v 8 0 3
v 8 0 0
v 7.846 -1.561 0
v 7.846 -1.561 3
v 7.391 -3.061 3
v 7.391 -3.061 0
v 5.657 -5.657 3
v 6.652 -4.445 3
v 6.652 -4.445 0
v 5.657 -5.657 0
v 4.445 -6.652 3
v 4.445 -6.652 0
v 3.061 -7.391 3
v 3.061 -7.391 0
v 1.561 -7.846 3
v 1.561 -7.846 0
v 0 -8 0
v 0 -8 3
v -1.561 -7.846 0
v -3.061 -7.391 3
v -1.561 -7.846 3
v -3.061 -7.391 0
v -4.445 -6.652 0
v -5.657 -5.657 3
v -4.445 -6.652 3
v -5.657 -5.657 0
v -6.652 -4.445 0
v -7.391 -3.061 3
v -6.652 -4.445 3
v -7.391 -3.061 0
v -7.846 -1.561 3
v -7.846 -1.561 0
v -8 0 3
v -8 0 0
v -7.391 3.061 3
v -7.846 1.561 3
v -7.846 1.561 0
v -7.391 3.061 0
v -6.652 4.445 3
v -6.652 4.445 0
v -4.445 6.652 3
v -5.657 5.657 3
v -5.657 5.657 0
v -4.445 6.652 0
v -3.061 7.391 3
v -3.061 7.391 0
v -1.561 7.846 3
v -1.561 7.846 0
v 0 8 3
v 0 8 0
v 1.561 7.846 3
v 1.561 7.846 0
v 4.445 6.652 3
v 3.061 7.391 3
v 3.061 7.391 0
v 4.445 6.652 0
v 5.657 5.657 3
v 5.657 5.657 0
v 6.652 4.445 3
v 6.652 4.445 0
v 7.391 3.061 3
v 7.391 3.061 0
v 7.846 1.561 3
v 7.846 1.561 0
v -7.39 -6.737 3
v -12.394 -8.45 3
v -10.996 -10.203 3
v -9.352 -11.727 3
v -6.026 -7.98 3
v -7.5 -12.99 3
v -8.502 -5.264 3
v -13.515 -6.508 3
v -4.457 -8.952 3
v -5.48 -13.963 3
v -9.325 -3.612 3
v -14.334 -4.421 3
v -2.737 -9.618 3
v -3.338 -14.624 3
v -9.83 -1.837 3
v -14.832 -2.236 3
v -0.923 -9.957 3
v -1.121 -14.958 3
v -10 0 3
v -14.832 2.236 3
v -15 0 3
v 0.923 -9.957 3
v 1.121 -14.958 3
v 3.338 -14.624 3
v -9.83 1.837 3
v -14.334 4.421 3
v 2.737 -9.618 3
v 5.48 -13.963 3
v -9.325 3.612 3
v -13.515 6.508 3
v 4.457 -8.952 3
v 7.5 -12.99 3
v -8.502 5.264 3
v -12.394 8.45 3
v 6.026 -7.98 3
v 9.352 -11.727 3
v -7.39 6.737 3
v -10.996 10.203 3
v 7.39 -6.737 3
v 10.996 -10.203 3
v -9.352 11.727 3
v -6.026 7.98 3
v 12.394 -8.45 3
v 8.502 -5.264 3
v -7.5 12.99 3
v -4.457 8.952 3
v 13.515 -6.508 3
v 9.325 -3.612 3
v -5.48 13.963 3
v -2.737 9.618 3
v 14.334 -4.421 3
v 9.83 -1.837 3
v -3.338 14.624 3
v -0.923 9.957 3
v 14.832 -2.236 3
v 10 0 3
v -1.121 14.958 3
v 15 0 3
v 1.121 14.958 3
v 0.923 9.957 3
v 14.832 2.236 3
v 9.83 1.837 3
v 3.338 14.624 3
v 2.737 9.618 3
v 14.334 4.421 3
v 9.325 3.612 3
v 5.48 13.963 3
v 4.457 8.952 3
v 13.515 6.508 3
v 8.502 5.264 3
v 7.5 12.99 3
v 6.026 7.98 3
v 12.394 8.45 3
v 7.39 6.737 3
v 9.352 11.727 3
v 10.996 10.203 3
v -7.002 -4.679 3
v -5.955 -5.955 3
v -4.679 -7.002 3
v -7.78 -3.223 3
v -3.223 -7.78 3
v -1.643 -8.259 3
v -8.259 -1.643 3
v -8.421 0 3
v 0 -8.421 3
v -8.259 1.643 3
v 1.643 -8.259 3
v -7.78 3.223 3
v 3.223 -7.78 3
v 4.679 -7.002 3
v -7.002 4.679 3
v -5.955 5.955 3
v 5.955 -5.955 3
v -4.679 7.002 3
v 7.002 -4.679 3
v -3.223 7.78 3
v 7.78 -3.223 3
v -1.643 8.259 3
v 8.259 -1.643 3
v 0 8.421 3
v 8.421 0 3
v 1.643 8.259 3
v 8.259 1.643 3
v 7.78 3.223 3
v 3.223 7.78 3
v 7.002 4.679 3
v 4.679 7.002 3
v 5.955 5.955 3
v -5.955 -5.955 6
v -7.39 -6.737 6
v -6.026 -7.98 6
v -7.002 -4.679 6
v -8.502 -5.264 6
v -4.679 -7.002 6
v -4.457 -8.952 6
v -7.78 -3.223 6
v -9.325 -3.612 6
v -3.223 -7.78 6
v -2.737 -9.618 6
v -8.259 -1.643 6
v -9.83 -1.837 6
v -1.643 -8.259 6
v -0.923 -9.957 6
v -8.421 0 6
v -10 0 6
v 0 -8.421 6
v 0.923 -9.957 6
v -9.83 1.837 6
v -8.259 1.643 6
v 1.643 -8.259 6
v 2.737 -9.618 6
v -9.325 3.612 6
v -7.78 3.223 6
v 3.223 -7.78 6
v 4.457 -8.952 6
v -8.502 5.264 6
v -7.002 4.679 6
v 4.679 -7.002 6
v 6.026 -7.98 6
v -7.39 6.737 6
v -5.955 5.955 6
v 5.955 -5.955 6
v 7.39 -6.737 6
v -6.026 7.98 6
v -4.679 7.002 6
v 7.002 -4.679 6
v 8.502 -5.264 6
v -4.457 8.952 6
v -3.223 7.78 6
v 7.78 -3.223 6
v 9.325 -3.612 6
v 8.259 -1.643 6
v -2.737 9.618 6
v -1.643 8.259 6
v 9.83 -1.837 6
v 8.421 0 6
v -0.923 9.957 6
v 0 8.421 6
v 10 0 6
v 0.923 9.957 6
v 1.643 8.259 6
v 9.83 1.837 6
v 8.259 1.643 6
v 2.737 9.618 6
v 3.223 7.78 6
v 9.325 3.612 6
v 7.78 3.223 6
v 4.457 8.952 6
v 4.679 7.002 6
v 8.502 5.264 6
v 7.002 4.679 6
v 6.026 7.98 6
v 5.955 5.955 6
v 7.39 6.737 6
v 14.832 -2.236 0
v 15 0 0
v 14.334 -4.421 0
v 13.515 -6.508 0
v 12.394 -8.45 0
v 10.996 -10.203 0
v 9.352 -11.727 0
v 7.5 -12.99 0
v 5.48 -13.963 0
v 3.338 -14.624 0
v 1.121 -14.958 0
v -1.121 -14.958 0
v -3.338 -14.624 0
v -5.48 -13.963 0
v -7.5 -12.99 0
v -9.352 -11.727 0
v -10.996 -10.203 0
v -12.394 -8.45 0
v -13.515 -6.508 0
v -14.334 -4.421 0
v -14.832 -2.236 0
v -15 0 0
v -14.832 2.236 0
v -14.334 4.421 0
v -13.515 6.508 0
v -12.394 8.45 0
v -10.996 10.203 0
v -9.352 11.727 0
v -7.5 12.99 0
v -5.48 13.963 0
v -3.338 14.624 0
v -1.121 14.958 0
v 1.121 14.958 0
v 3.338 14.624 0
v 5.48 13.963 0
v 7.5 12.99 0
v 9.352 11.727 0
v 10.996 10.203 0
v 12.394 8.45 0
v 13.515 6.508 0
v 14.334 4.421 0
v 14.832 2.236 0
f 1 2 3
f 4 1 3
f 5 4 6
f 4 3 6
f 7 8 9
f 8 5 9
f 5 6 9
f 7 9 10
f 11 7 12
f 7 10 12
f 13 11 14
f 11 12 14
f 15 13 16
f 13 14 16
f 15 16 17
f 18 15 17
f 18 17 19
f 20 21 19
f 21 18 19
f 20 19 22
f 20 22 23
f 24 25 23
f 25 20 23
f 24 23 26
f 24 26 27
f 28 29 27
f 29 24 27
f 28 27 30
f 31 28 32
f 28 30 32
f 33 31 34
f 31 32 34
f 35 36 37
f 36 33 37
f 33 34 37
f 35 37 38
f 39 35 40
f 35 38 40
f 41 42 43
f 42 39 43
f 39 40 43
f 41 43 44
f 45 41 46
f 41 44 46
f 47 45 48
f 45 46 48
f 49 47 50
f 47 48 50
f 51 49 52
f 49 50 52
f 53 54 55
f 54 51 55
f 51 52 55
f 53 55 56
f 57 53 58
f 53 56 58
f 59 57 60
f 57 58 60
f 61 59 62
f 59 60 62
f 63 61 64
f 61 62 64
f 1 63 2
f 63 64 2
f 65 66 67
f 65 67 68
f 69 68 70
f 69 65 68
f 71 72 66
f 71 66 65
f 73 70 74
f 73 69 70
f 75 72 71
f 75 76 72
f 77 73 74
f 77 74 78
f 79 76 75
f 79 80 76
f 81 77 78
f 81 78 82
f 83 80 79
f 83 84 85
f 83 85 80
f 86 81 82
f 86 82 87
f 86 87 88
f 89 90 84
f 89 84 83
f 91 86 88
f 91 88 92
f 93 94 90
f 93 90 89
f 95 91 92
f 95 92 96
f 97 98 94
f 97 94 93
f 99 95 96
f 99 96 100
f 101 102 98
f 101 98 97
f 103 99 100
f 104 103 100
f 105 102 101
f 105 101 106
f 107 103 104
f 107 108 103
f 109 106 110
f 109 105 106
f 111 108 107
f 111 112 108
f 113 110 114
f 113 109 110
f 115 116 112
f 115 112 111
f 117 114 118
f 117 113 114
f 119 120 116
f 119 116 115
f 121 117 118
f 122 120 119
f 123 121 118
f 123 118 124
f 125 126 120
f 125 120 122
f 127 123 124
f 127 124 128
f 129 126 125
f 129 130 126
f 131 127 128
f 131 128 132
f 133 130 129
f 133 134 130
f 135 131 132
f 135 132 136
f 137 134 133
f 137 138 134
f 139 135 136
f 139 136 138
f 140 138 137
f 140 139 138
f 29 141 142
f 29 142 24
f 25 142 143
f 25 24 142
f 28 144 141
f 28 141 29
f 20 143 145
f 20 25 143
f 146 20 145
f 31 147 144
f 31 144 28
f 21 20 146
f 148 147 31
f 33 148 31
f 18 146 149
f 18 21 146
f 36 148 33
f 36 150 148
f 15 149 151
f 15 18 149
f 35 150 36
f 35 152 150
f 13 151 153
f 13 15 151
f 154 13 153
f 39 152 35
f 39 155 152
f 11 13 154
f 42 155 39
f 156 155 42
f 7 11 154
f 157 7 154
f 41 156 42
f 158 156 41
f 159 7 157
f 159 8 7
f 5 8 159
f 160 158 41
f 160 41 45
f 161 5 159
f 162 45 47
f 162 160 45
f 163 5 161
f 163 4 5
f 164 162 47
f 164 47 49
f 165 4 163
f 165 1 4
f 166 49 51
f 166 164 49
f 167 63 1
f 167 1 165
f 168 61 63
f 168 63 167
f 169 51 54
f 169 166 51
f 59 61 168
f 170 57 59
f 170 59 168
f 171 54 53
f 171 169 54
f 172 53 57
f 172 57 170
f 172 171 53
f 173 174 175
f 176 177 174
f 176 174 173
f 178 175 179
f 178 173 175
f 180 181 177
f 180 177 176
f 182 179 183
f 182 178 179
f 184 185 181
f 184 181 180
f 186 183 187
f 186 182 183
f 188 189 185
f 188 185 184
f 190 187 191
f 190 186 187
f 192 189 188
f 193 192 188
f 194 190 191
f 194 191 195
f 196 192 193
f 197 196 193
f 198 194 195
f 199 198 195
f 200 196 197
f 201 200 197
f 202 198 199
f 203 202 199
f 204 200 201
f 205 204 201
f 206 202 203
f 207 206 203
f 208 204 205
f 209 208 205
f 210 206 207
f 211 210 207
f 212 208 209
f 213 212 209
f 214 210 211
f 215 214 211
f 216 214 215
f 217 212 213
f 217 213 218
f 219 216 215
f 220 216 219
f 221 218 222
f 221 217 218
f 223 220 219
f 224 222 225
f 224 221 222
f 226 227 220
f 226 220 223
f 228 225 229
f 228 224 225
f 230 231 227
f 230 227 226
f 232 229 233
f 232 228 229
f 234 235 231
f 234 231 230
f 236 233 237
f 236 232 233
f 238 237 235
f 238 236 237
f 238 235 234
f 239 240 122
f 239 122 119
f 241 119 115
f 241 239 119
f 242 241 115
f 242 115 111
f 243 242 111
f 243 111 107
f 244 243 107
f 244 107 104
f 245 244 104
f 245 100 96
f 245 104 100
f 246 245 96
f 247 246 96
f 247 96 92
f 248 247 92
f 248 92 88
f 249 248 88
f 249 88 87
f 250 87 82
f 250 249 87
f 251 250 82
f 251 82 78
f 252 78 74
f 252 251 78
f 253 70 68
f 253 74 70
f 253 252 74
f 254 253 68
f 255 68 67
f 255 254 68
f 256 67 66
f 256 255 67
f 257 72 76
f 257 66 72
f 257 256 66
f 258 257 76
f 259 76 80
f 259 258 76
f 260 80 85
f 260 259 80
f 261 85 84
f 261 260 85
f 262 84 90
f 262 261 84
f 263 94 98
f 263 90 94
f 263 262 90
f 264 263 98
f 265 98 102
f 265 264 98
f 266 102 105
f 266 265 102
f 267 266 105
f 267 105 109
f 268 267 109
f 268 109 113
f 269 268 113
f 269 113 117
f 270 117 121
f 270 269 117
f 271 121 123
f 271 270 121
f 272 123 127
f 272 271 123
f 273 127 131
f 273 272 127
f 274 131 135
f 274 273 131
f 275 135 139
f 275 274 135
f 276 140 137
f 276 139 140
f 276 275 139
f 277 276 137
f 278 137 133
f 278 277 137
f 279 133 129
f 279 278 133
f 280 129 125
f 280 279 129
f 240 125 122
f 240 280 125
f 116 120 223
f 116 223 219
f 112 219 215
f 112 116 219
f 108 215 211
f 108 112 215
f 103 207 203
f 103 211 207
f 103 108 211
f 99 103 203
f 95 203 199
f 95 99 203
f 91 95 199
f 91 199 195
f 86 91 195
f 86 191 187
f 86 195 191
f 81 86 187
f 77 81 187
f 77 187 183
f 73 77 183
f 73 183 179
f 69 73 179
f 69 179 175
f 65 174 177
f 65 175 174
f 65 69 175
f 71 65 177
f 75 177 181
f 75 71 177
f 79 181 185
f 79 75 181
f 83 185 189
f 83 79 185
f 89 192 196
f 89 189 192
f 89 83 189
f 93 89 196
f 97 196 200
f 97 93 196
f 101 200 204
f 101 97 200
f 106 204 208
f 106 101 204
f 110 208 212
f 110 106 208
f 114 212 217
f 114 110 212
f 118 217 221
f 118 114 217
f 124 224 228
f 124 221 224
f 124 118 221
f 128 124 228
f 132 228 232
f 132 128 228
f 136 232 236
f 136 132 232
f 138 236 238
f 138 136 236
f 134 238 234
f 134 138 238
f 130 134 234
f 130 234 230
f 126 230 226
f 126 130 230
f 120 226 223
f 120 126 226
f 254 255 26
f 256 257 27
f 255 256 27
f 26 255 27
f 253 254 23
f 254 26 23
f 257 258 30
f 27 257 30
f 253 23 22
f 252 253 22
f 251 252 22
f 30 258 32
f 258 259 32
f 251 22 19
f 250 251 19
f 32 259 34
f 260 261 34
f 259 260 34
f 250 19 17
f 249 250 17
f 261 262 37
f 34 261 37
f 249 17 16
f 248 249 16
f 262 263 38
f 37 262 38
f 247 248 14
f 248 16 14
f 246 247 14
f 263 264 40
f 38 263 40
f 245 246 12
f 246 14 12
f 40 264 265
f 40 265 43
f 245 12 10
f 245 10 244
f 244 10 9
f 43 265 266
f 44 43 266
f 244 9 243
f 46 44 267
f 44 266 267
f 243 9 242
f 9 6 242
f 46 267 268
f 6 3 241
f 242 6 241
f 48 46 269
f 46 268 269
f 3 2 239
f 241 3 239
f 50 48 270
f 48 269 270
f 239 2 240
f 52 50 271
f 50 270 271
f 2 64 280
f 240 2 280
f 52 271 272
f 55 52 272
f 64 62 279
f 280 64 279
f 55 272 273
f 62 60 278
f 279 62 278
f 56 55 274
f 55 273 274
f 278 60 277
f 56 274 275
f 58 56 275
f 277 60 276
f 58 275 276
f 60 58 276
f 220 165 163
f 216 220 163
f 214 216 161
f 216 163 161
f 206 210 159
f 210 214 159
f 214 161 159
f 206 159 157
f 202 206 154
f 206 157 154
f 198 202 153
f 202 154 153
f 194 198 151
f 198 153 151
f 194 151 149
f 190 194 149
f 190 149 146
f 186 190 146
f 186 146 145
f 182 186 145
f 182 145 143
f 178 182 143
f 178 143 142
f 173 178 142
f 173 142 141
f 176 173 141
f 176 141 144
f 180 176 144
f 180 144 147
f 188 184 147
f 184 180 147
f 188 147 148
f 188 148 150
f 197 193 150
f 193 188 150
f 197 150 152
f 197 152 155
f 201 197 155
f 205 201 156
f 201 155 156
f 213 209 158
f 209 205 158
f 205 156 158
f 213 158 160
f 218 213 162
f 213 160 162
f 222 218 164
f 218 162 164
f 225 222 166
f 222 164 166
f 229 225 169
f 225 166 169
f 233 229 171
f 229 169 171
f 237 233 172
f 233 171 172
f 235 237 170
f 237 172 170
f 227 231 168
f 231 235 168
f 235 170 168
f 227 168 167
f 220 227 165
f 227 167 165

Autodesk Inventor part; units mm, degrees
ref_plane "YZ Plane" through (0, 0, 0) normal (1, 0, 0) x (0, 1, 0)
ref_plane "XZ Plane" through (0, 0, 0) normal (0, 1, 0) x (-1, 0, 0)
ref_plane "XY Plane" through (0, 0, 0) normal (0, 0, 1) x (1, 0, 0)
sketch "Sketch1" plane through (0, 0, 0) normal (0, 0, 1) x (1, 0, 0)
  circle A0 centre (0, 0) radius 8
  circle A1 centre (0, 0) radius 15
  dimension "d0" = 16
  dimension "d1" = 30
extrude "Extrusion1" add sketch "Sketch1" along normal blind 3
sketch "Sketch2" plane through (0, 0, 3) normal (0, 0, 1) x (1, 0, 0)
  circle A0 centre (0, 0) radius 8.4211
  circle A1 centre (0, 0) radius 10
  dimension "d4" = 20
extrude "Extrusion2" add sketch "Sketch2" along normal blind 3
properties part number "bushing"
